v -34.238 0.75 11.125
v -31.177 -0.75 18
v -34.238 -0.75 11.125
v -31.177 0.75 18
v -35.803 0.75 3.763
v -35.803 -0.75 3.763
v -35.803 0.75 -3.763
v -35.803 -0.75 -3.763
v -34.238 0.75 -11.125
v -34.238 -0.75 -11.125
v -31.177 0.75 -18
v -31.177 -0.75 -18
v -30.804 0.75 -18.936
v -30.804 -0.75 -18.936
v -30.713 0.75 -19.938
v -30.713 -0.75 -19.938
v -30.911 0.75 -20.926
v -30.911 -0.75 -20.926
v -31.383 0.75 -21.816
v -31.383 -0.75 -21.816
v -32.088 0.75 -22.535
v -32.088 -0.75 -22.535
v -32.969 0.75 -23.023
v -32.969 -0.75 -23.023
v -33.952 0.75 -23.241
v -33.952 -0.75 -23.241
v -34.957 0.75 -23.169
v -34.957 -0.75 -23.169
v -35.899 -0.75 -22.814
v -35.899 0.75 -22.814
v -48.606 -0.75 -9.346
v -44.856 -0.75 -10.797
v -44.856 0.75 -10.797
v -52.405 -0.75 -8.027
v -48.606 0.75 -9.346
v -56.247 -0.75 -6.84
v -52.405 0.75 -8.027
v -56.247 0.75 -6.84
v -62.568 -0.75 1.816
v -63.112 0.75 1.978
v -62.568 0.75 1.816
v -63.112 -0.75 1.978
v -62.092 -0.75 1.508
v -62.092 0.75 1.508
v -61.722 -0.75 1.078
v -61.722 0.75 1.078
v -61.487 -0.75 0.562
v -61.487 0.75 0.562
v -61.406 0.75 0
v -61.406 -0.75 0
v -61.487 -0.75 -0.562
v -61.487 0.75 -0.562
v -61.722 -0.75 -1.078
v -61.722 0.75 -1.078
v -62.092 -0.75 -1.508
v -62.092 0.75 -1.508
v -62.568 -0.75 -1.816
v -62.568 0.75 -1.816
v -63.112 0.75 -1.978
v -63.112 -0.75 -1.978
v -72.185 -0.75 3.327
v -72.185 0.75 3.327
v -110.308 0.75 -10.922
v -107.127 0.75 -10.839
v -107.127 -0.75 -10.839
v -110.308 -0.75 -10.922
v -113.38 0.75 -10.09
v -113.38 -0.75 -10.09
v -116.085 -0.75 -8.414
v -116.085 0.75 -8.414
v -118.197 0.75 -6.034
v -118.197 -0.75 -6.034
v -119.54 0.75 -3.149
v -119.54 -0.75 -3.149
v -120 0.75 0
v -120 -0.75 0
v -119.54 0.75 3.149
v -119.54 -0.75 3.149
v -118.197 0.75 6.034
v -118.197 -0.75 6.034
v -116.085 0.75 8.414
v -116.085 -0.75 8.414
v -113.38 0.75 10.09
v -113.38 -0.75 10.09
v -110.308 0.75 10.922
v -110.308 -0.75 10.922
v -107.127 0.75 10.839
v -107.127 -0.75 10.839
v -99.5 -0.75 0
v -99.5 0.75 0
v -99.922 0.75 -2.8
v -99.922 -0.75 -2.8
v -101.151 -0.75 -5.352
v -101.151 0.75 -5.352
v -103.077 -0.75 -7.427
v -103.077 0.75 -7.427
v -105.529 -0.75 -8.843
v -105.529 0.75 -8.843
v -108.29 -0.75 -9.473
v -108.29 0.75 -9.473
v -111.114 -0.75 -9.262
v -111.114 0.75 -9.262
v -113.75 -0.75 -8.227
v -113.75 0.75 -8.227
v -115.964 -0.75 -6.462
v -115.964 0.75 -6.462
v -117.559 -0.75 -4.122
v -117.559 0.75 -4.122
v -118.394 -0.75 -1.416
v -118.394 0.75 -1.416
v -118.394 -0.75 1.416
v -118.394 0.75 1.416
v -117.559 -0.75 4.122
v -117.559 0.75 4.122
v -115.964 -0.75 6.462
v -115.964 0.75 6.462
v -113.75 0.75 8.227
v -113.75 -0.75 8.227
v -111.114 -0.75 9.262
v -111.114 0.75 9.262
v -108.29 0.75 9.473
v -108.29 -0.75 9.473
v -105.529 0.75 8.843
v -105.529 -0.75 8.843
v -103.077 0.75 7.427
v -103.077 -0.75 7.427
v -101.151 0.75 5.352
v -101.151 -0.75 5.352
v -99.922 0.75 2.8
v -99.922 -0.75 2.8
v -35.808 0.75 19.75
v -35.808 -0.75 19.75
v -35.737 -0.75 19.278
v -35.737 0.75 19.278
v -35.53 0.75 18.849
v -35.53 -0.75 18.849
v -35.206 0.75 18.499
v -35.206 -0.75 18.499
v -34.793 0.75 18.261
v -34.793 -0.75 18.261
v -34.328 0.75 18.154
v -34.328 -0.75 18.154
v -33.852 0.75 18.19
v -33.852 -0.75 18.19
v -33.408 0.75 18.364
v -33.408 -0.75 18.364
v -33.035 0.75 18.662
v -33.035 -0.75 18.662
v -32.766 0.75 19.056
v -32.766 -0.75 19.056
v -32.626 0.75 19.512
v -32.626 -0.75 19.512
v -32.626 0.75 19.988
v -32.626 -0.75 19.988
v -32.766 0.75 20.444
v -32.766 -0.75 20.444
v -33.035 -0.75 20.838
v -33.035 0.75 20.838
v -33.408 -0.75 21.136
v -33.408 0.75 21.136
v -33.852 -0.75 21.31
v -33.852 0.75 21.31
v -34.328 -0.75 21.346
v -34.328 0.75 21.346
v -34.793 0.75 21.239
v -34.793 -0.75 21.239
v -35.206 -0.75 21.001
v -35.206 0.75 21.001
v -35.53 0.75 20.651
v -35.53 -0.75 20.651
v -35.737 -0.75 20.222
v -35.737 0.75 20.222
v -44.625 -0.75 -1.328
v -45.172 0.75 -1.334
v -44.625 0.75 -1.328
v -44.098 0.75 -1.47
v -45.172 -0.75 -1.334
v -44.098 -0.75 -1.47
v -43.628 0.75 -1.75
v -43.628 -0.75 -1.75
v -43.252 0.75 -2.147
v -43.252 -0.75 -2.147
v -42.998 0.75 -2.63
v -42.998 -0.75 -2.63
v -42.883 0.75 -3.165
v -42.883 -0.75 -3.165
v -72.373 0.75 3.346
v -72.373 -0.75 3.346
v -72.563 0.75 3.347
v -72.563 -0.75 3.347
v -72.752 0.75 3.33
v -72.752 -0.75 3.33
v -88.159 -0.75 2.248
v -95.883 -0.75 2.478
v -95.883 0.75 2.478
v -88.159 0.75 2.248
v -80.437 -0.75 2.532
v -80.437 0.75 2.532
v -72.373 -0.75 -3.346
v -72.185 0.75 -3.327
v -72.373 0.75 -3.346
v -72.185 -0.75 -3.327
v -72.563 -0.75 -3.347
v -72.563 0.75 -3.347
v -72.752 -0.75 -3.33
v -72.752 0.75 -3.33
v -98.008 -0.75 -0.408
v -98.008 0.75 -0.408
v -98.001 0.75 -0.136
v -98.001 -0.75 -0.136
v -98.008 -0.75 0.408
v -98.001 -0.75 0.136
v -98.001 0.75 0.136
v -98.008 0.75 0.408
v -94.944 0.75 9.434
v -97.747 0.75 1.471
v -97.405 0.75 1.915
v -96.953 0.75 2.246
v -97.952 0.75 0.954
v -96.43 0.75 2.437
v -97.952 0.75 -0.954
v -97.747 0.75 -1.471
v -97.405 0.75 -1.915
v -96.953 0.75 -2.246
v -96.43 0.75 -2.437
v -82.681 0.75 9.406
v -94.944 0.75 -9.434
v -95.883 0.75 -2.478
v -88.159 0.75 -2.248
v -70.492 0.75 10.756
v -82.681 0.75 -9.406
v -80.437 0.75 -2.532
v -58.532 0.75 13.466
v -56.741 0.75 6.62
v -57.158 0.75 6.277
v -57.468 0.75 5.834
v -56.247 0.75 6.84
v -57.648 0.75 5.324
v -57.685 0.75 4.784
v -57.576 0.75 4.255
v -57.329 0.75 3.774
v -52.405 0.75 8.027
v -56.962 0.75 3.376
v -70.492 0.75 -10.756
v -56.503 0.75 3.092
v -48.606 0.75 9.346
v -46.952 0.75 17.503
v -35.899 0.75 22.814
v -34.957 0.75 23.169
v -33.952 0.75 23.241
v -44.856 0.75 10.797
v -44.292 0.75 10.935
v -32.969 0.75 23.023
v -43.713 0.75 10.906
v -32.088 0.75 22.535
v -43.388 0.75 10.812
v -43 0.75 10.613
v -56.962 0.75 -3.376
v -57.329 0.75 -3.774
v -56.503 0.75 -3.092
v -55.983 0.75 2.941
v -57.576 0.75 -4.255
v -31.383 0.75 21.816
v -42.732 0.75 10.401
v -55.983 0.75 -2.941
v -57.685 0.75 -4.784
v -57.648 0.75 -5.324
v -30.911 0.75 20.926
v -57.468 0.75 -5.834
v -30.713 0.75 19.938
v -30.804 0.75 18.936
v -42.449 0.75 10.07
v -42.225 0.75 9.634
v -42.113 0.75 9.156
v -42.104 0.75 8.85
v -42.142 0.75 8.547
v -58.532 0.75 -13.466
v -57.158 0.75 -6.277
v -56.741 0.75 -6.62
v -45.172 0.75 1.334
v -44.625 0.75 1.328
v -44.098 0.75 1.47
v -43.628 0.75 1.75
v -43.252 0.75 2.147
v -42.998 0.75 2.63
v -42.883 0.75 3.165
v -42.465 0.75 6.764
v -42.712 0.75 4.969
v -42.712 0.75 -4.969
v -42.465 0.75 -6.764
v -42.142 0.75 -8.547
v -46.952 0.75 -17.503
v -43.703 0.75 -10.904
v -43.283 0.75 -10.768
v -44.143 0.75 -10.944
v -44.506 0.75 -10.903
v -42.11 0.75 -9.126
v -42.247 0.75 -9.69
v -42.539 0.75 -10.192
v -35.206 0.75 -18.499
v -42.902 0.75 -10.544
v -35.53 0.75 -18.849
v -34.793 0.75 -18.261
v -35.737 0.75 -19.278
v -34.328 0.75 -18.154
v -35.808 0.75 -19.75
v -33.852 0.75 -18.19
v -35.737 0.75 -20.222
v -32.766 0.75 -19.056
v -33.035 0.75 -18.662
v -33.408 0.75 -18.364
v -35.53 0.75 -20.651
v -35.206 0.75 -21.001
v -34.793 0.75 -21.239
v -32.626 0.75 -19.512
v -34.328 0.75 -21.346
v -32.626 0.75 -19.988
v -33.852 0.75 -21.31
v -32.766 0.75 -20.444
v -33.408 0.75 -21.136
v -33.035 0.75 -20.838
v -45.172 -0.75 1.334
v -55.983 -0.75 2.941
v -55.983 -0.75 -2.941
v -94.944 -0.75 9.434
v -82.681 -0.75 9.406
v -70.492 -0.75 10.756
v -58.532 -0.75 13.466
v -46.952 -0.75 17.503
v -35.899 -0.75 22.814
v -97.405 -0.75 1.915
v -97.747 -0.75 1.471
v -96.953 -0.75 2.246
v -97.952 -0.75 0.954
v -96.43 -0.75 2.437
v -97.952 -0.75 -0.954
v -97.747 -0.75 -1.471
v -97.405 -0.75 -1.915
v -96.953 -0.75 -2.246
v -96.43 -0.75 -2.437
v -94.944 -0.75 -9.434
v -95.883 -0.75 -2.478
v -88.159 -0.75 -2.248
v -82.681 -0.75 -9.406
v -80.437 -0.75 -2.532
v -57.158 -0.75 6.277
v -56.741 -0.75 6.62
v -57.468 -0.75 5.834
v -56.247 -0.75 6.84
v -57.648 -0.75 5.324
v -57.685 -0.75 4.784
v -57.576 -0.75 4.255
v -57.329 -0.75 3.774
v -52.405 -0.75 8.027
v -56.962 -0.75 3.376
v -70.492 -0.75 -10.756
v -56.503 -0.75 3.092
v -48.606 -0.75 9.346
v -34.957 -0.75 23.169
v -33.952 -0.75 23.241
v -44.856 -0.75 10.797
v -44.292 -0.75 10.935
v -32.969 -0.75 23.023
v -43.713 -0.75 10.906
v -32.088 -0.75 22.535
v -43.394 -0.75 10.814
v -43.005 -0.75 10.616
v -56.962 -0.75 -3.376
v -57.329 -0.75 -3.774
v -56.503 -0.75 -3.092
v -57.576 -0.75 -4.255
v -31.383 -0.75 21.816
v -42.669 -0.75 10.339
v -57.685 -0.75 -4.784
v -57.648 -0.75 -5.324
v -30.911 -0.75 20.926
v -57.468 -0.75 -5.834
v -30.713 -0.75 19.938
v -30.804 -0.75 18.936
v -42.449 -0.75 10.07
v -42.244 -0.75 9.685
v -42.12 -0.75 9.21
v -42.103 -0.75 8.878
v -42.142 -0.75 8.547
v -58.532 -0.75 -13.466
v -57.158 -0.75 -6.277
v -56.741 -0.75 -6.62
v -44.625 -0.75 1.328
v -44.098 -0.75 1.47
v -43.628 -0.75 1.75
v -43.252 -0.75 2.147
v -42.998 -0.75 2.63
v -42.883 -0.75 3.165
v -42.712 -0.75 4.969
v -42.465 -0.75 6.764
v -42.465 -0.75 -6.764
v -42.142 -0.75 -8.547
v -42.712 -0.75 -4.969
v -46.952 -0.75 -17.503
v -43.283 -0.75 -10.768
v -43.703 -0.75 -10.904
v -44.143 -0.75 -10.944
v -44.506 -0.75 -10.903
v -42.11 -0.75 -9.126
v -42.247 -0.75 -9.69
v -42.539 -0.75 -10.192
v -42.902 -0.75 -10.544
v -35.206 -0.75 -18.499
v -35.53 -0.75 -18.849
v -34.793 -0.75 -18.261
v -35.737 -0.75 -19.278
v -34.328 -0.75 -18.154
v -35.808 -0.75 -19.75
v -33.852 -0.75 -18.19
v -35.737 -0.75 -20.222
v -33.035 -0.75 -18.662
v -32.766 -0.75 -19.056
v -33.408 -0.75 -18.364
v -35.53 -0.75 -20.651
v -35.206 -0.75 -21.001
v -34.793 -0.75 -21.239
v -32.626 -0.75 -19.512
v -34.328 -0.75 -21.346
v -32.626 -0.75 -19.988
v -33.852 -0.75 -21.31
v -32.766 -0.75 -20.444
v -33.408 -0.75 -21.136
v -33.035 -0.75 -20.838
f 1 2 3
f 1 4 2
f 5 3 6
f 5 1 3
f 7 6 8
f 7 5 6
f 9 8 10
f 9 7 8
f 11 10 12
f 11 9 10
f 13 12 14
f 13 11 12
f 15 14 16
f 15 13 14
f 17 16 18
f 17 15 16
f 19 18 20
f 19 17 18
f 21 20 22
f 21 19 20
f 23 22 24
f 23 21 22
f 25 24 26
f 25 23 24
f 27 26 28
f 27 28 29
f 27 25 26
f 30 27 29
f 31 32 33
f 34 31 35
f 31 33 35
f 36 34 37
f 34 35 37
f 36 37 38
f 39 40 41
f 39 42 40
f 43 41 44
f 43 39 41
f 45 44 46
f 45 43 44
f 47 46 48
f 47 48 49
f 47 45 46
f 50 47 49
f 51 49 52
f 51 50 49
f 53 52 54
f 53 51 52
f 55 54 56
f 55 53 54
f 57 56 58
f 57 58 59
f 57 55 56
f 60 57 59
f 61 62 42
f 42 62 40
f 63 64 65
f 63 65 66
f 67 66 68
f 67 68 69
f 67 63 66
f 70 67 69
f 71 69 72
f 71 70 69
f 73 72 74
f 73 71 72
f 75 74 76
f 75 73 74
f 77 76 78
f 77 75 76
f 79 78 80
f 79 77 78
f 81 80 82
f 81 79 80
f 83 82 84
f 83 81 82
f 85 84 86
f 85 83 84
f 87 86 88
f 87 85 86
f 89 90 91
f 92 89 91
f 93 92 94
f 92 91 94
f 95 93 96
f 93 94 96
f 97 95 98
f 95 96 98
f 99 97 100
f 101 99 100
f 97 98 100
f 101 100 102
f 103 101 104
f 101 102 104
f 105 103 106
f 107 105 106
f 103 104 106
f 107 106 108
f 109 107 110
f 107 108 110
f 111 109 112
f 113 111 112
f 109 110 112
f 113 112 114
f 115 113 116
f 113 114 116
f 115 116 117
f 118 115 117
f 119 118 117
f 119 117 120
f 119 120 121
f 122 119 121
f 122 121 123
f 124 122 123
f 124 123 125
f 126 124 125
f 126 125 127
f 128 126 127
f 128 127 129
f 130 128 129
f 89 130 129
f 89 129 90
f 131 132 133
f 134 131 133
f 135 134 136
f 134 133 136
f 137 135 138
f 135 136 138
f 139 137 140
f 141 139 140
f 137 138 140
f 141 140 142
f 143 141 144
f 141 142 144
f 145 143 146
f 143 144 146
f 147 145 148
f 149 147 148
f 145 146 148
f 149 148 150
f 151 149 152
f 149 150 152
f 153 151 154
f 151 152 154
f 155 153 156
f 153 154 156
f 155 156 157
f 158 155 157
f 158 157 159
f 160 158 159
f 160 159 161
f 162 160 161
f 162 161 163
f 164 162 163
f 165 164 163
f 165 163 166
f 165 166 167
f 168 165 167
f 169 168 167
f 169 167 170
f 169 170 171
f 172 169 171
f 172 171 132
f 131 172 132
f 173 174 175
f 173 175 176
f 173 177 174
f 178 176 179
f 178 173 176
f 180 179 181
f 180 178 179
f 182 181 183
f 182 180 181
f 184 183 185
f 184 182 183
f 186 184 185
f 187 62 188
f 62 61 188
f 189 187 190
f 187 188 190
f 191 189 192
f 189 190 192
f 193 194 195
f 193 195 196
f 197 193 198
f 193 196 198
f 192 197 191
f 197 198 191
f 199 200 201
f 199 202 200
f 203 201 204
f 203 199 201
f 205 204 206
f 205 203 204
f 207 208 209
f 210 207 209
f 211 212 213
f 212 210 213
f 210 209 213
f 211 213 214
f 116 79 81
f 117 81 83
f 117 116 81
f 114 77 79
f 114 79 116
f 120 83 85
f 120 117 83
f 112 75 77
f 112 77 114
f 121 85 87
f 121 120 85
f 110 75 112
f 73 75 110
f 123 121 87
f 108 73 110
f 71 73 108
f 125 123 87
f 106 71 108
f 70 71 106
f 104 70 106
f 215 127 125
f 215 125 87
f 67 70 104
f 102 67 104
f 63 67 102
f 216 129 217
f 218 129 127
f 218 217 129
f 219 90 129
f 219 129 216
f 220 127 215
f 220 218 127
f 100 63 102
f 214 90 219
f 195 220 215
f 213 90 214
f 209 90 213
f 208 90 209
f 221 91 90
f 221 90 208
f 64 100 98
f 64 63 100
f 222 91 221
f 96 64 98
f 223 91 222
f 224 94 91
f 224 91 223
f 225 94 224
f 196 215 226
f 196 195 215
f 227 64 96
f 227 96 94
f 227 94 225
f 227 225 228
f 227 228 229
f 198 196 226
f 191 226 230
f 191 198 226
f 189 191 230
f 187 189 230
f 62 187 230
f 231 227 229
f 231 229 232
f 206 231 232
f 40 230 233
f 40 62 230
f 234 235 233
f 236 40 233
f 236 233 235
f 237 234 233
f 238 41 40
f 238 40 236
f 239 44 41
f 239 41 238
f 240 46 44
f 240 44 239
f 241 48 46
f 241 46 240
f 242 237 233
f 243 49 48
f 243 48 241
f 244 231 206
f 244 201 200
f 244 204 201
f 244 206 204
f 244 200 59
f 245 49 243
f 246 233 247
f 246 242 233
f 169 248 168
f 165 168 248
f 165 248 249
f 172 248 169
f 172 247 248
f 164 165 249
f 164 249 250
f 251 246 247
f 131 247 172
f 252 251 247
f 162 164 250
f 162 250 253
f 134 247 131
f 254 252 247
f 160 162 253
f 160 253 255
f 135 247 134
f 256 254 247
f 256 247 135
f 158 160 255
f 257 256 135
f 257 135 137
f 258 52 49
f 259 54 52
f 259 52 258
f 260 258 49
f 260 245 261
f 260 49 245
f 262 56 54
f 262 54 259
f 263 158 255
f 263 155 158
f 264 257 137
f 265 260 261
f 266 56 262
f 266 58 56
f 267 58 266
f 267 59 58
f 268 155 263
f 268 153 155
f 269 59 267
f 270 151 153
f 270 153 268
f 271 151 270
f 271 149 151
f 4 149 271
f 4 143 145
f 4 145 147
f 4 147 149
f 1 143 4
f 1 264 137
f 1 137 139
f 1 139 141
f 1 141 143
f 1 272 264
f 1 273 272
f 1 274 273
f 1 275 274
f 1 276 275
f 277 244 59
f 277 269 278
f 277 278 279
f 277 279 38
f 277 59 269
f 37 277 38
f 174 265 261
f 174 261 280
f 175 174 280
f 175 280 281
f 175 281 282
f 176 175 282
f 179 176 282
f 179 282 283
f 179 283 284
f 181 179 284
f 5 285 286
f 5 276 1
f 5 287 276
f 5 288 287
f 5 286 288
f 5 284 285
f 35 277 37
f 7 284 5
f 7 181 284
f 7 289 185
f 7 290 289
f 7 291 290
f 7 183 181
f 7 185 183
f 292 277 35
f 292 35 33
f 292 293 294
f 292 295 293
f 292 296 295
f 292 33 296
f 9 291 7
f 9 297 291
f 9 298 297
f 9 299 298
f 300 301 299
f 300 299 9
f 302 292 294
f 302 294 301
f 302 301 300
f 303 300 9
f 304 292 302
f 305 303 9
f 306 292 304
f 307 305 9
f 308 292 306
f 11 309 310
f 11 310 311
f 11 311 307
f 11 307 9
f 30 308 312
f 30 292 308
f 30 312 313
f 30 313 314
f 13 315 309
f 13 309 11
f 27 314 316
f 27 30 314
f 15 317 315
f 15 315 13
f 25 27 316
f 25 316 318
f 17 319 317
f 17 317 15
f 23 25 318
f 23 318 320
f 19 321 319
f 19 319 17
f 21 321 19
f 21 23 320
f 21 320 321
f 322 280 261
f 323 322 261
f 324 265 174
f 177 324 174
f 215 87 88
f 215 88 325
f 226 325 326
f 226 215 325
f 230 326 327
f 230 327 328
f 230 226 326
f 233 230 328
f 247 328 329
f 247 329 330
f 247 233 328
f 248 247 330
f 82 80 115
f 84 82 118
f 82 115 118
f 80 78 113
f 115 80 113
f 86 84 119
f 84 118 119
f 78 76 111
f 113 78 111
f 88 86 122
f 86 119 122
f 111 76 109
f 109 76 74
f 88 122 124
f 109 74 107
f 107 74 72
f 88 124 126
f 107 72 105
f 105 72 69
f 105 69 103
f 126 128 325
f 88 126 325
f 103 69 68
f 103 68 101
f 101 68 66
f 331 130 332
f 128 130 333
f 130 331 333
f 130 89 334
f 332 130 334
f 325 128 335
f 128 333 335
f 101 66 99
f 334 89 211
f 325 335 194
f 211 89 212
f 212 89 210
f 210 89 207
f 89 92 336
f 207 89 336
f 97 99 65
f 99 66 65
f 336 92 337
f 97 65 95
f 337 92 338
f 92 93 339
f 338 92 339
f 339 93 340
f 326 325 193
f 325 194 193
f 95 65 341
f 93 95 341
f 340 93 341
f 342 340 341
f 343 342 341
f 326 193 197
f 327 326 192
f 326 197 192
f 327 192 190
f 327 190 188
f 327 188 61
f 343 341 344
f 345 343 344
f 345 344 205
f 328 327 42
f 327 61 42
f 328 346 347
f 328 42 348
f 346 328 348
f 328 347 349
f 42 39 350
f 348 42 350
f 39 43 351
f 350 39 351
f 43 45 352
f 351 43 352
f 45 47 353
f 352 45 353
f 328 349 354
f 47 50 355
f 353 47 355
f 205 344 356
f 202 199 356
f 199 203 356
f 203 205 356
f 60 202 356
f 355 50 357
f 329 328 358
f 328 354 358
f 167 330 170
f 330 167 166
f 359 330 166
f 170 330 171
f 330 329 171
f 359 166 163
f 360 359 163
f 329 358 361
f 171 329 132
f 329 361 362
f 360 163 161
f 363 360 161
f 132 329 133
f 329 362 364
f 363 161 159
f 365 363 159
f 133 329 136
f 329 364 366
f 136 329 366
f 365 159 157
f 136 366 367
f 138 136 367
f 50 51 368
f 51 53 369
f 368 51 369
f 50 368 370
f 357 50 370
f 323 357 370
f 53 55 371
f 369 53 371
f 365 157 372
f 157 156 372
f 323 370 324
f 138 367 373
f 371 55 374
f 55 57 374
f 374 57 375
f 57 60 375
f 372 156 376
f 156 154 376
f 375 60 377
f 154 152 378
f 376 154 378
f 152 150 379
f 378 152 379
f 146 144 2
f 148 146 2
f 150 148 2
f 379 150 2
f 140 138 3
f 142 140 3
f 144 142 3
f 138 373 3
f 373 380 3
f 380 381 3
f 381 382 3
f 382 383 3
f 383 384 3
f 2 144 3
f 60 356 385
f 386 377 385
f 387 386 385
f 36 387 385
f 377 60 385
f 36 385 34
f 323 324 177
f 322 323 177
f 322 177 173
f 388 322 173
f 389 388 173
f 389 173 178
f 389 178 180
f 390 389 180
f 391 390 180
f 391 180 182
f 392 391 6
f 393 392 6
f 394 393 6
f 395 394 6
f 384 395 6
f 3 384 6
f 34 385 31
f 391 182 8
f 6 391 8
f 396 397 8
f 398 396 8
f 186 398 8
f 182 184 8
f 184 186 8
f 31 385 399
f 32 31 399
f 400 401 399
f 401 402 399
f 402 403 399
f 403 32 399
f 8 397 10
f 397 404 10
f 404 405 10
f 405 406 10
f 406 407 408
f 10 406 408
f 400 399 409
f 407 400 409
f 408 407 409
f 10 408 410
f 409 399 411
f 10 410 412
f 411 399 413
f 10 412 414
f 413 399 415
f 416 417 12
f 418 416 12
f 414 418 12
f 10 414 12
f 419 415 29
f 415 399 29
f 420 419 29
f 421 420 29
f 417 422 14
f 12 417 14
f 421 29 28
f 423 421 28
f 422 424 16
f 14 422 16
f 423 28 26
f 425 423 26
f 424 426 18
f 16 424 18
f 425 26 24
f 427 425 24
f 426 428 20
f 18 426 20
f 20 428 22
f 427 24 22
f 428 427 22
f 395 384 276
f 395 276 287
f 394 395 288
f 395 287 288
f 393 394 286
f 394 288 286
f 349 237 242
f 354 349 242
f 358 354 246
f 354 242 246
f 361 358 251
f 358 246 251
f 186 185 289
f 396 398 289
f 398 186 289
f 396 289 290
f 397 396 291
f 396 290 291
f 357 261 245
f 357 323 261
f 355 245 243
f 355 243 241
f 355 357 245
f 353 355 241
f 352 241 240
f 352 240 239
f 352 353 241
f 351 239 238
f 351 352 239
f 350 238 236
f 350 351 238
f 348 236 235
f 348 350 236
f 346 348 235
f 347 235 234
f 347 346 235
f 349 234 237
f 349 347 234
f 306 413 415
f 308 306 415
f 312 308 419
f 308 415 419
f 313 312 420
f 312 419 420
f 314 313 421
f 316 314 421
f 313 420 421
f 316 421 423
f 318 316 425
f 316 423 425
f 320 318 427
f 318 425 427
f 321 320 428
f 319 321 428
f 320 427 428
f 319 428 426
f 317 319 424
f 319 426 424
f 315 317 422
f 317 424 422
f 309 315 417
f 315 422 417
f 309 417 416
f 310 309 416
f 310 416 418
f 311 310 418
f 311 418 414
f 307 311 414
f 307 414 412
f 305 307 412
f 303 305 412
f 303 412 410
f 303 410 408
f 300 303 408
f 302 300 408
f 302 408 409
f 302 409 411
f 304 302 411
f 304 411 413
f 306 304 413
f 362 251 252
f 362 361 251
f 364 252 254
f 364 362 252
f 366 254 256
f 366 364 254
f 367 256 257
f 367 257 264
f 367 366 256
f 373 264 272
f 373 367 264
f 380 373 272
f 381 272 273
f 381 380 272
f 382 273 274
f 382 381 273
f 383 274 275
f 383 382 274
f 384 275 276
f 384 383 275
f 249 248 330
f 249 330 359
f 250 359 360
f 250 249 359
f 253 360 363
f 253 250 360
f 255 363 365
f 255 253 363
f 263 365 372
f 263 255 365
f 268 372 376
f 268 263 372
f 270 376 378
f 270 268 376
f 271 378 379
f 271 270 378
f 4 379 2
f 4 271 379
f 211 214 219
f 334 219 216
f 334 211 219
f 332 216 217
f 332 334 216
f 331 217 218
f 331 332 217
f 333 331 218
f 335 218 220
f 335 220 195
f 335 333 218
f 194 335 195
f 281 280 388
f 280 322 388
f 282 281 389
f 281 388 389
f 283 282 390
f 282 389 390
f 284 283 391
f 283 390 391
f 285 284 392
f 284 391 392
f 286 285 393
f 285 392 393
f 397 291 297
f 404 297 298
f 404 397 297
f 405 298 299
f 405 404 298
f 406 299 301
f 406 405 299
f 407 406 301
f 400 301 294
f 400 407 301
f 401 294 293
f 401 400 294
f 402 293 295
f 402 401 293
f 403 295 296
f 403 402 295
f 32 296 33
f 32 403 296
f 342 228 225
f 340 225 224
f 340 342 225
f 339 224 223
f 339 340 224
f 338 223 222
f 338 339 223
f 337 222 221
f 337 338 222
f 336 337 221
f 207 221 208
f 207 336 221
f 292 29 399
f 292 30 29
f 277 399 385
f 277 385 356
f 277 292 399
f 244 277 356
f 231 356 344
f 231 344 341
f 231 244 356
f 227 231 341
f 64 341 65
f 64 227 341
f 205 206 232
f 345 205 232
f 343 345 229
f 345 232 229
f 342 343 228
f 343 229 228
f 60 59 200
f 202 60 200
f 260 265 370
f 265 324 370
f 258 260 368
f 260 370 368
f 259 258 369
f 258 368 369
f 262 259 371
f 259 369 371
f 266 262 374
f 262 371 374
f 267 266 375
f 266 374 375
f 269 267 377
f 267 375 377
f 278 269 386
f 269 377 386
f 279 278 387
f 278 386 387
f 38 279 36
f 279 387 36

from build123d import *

# Parameters (mm, degrees)
SKETCH1_R                      = 3.5
BOSS_EXTRUDE1_DEPTH            = 0.75
F_3_2_3_2_DIAMETER_HOLE1_D     = 3.2
F_3_2_3_2_DIAMETER_HOLE1_DEPTH = 10
F_3_2_3_2_DIAMETER_HOLE1_TIP   = 0.96137699
CUT_EXTRUDE1_DEPTH             = 2.5
FILLET1_R                      = 2
SKETCH7_R                      = 9.5
CUT_EXTRUDE2_DEPTH             = 2.5000001


with BuildPart() as part:
    # Sketch1 → Boss-Extrude1 (new body, symmetric)
    with BuildSketch(Plane(origin=(0, 0, 0), x_dir=(1, 0, 0), z_dir=(0, 1, 0))):
        with BuildLine():
            ThreePointArc((-37.239092363, -21.5), (-43, 0), (-37.239092363, 21.5))
            ThreePointArc((-37.239092363, 21.5), (-36.658838331, 22.248681329), (-35.899079455, 22.81435343))
            ThreePointArc((-35.899079455, 22.81435343), (-70.492179883, 10.7556392), (-107.126701642, 10.839315166))
            ThreePointArc((-107.126701642, 10.839315166), (-120, 0), (-107.126701642, -10.839315166))
            ThreePointArc((-107.126701642, -10.839315166), (-70.492179883, -10.7556392), (-35.899079455, -22.81435343))
            ThreePointArc((-35.899079455, -22.81435343), (-36.658838331, -22.248681329), (-37.239092363, -21.5))
        make_face()
        with BuildLine():
            ThreePointArc((-31.176914536, 18), (-35.958003449, 16.718911087), (-37.239092363, 21.5))
            ThreePointArc((-37.239092363, 21.5), (-43, 0), (-37.239092363, -21.5))
            ThreePointArc((-37.239092363, -21.5), (-35.958003449, -16.718911087), (-31.176914536, -18))
            ThreePointArc((-31.176914536, -18), (-36, 0), (-31.176914536, 18))
        make_face()
        with Locations((-34.208003449, -19.75)):
            Circle(SKETCH1_R)
        with Locations((-34.208003449, 19.75)):
            Circle(SKETCH1_R)
    extrude(amount=BOSS_EXTRUDE1_DEPTH, both=True)

    # Ø3.2 (3.2) Diameter Hole1
    with Locations(Plane(origin=(0, 0.75, 0), x_dir=(1, 0, 0), z_dir=(0, 1, 0))):
        with Locations((-34.208003449, 19.75), (-34.208003449, -19.75), (-106.530652164, 14.288188173), (-106.530652164, -14.288188173)):
            Hole(F_3_2_3_2_DIAMETER_HOLE1_D / 2, depth=F_3_2_3_2_DIAMETER_HOLE1_DEPTH)
            with Locations((0, 0, -(F_3_2_3_2_DIAMETER_HOLE1_DEPTH + F_3_2_3_2_DIAMETER_HOLE1_TIP / 2))):  # 118° drill point
                Cone(0, F_3_2_3_2_DIAMETER_HOLE1_D / 2, F_3_2_3_2_DIAMETER_HOLE1_TIP, mode=Mode.SUBTRACT)

    # Sketch6 → Cut-Extrude1 (cut, through all)
    with BuildSketch(Plane(origin=(0, 0.75, 0), x_dir=(1, 0, 0), z_dir=(0, 1, 0))):
        with BuildLine():
            Line((-72.469338063, -3.369046694), (-49.802019621, 0))
            Line((-49.802019621, 0), (-72.469338063, 3.369046694))
            ThreePointArc((-72.469338063, 3.369046694), (-85.377857375, 2.290839769), (-98.326107181, 2.65857332))
            ThreePointArc((-98.326107181, 2.65857332), (-98, 0), (-98.326107181, -2.65857332))
            ThreePointArc((-98.326107181, -2.65857332), (-85.377857375, -2.290839769), (-72.469338063, -3.369046694))
        make_face()
        with BuildLine():
            Line((-66.096117167, 4.443764231), (-42.988154947, 1.009224591))
            ThreePointArc((-42.988154947, 1.009224591), (-42.467311238, 6.747405149), (-41.183985346, 12.36443897))
            ThreePointArc((-41.183985346, 12.36443897), (-53.416219701, 7.70010587), (-66.096117167, 4.443764231))
        make_face()
        with BuildLine():
            ThreePointArc((-41.183985346, -12.36443897), (-42.467311238, -6.747405149), (-42.988154947, -1.009224591))
            Line((-42.988154947, -1.009224591), (-66.096117167, -4.443764231))
            ThreePointArc((-66.096117167, -4.443764231), (-53.416219701, -7.70010587), (-41.183985346, -12.36443897))
        make_face()
    extrude(amount=-CUT_EXTRUDE1_DEPTH, mode=Mode.SUBTRACT)

    # Fillet1
    fillet1_edges = [part.edges().sort_by_distance(p)[0] for p in [
        (-98.326107181, 0, 2.65857332),
        (-98.326107181, 0, -2.65857332),
        (-72.469338063, 0, -3.369046694),
        (-49.802019621, 0, 0),
        (-72.469338063, 0, 3.369046694),
        (-41.183985346, 0, -12.36443897),
        (-42.988154947, 0, -1.009224591),
        (-66.096117167, 0, -4.443764231),
        (-42.988154947, 0, 1.009224591),
        (-41.183985346, 0, 12.36443897),
        (-66.096117167, 0, 4.443764231),
    ]]
    fillet(fillet1_edges, radius=FILLET1_R)

    # Sketch7 → Cut-Extrude2 (cut, through all)
    with BuildSketch(Plane(origin=(0, 0.75, 0), x_dir=(1, 0, 0), z_dir=(0, 1, 0))):
        with Locations((-109, 0)):
            Circle(SKETCH7_R)
    extrude(amount=-CUT_EXTRUDE2_DEPTH, mode=Mode.SUBTRACT)


solid = part.part
